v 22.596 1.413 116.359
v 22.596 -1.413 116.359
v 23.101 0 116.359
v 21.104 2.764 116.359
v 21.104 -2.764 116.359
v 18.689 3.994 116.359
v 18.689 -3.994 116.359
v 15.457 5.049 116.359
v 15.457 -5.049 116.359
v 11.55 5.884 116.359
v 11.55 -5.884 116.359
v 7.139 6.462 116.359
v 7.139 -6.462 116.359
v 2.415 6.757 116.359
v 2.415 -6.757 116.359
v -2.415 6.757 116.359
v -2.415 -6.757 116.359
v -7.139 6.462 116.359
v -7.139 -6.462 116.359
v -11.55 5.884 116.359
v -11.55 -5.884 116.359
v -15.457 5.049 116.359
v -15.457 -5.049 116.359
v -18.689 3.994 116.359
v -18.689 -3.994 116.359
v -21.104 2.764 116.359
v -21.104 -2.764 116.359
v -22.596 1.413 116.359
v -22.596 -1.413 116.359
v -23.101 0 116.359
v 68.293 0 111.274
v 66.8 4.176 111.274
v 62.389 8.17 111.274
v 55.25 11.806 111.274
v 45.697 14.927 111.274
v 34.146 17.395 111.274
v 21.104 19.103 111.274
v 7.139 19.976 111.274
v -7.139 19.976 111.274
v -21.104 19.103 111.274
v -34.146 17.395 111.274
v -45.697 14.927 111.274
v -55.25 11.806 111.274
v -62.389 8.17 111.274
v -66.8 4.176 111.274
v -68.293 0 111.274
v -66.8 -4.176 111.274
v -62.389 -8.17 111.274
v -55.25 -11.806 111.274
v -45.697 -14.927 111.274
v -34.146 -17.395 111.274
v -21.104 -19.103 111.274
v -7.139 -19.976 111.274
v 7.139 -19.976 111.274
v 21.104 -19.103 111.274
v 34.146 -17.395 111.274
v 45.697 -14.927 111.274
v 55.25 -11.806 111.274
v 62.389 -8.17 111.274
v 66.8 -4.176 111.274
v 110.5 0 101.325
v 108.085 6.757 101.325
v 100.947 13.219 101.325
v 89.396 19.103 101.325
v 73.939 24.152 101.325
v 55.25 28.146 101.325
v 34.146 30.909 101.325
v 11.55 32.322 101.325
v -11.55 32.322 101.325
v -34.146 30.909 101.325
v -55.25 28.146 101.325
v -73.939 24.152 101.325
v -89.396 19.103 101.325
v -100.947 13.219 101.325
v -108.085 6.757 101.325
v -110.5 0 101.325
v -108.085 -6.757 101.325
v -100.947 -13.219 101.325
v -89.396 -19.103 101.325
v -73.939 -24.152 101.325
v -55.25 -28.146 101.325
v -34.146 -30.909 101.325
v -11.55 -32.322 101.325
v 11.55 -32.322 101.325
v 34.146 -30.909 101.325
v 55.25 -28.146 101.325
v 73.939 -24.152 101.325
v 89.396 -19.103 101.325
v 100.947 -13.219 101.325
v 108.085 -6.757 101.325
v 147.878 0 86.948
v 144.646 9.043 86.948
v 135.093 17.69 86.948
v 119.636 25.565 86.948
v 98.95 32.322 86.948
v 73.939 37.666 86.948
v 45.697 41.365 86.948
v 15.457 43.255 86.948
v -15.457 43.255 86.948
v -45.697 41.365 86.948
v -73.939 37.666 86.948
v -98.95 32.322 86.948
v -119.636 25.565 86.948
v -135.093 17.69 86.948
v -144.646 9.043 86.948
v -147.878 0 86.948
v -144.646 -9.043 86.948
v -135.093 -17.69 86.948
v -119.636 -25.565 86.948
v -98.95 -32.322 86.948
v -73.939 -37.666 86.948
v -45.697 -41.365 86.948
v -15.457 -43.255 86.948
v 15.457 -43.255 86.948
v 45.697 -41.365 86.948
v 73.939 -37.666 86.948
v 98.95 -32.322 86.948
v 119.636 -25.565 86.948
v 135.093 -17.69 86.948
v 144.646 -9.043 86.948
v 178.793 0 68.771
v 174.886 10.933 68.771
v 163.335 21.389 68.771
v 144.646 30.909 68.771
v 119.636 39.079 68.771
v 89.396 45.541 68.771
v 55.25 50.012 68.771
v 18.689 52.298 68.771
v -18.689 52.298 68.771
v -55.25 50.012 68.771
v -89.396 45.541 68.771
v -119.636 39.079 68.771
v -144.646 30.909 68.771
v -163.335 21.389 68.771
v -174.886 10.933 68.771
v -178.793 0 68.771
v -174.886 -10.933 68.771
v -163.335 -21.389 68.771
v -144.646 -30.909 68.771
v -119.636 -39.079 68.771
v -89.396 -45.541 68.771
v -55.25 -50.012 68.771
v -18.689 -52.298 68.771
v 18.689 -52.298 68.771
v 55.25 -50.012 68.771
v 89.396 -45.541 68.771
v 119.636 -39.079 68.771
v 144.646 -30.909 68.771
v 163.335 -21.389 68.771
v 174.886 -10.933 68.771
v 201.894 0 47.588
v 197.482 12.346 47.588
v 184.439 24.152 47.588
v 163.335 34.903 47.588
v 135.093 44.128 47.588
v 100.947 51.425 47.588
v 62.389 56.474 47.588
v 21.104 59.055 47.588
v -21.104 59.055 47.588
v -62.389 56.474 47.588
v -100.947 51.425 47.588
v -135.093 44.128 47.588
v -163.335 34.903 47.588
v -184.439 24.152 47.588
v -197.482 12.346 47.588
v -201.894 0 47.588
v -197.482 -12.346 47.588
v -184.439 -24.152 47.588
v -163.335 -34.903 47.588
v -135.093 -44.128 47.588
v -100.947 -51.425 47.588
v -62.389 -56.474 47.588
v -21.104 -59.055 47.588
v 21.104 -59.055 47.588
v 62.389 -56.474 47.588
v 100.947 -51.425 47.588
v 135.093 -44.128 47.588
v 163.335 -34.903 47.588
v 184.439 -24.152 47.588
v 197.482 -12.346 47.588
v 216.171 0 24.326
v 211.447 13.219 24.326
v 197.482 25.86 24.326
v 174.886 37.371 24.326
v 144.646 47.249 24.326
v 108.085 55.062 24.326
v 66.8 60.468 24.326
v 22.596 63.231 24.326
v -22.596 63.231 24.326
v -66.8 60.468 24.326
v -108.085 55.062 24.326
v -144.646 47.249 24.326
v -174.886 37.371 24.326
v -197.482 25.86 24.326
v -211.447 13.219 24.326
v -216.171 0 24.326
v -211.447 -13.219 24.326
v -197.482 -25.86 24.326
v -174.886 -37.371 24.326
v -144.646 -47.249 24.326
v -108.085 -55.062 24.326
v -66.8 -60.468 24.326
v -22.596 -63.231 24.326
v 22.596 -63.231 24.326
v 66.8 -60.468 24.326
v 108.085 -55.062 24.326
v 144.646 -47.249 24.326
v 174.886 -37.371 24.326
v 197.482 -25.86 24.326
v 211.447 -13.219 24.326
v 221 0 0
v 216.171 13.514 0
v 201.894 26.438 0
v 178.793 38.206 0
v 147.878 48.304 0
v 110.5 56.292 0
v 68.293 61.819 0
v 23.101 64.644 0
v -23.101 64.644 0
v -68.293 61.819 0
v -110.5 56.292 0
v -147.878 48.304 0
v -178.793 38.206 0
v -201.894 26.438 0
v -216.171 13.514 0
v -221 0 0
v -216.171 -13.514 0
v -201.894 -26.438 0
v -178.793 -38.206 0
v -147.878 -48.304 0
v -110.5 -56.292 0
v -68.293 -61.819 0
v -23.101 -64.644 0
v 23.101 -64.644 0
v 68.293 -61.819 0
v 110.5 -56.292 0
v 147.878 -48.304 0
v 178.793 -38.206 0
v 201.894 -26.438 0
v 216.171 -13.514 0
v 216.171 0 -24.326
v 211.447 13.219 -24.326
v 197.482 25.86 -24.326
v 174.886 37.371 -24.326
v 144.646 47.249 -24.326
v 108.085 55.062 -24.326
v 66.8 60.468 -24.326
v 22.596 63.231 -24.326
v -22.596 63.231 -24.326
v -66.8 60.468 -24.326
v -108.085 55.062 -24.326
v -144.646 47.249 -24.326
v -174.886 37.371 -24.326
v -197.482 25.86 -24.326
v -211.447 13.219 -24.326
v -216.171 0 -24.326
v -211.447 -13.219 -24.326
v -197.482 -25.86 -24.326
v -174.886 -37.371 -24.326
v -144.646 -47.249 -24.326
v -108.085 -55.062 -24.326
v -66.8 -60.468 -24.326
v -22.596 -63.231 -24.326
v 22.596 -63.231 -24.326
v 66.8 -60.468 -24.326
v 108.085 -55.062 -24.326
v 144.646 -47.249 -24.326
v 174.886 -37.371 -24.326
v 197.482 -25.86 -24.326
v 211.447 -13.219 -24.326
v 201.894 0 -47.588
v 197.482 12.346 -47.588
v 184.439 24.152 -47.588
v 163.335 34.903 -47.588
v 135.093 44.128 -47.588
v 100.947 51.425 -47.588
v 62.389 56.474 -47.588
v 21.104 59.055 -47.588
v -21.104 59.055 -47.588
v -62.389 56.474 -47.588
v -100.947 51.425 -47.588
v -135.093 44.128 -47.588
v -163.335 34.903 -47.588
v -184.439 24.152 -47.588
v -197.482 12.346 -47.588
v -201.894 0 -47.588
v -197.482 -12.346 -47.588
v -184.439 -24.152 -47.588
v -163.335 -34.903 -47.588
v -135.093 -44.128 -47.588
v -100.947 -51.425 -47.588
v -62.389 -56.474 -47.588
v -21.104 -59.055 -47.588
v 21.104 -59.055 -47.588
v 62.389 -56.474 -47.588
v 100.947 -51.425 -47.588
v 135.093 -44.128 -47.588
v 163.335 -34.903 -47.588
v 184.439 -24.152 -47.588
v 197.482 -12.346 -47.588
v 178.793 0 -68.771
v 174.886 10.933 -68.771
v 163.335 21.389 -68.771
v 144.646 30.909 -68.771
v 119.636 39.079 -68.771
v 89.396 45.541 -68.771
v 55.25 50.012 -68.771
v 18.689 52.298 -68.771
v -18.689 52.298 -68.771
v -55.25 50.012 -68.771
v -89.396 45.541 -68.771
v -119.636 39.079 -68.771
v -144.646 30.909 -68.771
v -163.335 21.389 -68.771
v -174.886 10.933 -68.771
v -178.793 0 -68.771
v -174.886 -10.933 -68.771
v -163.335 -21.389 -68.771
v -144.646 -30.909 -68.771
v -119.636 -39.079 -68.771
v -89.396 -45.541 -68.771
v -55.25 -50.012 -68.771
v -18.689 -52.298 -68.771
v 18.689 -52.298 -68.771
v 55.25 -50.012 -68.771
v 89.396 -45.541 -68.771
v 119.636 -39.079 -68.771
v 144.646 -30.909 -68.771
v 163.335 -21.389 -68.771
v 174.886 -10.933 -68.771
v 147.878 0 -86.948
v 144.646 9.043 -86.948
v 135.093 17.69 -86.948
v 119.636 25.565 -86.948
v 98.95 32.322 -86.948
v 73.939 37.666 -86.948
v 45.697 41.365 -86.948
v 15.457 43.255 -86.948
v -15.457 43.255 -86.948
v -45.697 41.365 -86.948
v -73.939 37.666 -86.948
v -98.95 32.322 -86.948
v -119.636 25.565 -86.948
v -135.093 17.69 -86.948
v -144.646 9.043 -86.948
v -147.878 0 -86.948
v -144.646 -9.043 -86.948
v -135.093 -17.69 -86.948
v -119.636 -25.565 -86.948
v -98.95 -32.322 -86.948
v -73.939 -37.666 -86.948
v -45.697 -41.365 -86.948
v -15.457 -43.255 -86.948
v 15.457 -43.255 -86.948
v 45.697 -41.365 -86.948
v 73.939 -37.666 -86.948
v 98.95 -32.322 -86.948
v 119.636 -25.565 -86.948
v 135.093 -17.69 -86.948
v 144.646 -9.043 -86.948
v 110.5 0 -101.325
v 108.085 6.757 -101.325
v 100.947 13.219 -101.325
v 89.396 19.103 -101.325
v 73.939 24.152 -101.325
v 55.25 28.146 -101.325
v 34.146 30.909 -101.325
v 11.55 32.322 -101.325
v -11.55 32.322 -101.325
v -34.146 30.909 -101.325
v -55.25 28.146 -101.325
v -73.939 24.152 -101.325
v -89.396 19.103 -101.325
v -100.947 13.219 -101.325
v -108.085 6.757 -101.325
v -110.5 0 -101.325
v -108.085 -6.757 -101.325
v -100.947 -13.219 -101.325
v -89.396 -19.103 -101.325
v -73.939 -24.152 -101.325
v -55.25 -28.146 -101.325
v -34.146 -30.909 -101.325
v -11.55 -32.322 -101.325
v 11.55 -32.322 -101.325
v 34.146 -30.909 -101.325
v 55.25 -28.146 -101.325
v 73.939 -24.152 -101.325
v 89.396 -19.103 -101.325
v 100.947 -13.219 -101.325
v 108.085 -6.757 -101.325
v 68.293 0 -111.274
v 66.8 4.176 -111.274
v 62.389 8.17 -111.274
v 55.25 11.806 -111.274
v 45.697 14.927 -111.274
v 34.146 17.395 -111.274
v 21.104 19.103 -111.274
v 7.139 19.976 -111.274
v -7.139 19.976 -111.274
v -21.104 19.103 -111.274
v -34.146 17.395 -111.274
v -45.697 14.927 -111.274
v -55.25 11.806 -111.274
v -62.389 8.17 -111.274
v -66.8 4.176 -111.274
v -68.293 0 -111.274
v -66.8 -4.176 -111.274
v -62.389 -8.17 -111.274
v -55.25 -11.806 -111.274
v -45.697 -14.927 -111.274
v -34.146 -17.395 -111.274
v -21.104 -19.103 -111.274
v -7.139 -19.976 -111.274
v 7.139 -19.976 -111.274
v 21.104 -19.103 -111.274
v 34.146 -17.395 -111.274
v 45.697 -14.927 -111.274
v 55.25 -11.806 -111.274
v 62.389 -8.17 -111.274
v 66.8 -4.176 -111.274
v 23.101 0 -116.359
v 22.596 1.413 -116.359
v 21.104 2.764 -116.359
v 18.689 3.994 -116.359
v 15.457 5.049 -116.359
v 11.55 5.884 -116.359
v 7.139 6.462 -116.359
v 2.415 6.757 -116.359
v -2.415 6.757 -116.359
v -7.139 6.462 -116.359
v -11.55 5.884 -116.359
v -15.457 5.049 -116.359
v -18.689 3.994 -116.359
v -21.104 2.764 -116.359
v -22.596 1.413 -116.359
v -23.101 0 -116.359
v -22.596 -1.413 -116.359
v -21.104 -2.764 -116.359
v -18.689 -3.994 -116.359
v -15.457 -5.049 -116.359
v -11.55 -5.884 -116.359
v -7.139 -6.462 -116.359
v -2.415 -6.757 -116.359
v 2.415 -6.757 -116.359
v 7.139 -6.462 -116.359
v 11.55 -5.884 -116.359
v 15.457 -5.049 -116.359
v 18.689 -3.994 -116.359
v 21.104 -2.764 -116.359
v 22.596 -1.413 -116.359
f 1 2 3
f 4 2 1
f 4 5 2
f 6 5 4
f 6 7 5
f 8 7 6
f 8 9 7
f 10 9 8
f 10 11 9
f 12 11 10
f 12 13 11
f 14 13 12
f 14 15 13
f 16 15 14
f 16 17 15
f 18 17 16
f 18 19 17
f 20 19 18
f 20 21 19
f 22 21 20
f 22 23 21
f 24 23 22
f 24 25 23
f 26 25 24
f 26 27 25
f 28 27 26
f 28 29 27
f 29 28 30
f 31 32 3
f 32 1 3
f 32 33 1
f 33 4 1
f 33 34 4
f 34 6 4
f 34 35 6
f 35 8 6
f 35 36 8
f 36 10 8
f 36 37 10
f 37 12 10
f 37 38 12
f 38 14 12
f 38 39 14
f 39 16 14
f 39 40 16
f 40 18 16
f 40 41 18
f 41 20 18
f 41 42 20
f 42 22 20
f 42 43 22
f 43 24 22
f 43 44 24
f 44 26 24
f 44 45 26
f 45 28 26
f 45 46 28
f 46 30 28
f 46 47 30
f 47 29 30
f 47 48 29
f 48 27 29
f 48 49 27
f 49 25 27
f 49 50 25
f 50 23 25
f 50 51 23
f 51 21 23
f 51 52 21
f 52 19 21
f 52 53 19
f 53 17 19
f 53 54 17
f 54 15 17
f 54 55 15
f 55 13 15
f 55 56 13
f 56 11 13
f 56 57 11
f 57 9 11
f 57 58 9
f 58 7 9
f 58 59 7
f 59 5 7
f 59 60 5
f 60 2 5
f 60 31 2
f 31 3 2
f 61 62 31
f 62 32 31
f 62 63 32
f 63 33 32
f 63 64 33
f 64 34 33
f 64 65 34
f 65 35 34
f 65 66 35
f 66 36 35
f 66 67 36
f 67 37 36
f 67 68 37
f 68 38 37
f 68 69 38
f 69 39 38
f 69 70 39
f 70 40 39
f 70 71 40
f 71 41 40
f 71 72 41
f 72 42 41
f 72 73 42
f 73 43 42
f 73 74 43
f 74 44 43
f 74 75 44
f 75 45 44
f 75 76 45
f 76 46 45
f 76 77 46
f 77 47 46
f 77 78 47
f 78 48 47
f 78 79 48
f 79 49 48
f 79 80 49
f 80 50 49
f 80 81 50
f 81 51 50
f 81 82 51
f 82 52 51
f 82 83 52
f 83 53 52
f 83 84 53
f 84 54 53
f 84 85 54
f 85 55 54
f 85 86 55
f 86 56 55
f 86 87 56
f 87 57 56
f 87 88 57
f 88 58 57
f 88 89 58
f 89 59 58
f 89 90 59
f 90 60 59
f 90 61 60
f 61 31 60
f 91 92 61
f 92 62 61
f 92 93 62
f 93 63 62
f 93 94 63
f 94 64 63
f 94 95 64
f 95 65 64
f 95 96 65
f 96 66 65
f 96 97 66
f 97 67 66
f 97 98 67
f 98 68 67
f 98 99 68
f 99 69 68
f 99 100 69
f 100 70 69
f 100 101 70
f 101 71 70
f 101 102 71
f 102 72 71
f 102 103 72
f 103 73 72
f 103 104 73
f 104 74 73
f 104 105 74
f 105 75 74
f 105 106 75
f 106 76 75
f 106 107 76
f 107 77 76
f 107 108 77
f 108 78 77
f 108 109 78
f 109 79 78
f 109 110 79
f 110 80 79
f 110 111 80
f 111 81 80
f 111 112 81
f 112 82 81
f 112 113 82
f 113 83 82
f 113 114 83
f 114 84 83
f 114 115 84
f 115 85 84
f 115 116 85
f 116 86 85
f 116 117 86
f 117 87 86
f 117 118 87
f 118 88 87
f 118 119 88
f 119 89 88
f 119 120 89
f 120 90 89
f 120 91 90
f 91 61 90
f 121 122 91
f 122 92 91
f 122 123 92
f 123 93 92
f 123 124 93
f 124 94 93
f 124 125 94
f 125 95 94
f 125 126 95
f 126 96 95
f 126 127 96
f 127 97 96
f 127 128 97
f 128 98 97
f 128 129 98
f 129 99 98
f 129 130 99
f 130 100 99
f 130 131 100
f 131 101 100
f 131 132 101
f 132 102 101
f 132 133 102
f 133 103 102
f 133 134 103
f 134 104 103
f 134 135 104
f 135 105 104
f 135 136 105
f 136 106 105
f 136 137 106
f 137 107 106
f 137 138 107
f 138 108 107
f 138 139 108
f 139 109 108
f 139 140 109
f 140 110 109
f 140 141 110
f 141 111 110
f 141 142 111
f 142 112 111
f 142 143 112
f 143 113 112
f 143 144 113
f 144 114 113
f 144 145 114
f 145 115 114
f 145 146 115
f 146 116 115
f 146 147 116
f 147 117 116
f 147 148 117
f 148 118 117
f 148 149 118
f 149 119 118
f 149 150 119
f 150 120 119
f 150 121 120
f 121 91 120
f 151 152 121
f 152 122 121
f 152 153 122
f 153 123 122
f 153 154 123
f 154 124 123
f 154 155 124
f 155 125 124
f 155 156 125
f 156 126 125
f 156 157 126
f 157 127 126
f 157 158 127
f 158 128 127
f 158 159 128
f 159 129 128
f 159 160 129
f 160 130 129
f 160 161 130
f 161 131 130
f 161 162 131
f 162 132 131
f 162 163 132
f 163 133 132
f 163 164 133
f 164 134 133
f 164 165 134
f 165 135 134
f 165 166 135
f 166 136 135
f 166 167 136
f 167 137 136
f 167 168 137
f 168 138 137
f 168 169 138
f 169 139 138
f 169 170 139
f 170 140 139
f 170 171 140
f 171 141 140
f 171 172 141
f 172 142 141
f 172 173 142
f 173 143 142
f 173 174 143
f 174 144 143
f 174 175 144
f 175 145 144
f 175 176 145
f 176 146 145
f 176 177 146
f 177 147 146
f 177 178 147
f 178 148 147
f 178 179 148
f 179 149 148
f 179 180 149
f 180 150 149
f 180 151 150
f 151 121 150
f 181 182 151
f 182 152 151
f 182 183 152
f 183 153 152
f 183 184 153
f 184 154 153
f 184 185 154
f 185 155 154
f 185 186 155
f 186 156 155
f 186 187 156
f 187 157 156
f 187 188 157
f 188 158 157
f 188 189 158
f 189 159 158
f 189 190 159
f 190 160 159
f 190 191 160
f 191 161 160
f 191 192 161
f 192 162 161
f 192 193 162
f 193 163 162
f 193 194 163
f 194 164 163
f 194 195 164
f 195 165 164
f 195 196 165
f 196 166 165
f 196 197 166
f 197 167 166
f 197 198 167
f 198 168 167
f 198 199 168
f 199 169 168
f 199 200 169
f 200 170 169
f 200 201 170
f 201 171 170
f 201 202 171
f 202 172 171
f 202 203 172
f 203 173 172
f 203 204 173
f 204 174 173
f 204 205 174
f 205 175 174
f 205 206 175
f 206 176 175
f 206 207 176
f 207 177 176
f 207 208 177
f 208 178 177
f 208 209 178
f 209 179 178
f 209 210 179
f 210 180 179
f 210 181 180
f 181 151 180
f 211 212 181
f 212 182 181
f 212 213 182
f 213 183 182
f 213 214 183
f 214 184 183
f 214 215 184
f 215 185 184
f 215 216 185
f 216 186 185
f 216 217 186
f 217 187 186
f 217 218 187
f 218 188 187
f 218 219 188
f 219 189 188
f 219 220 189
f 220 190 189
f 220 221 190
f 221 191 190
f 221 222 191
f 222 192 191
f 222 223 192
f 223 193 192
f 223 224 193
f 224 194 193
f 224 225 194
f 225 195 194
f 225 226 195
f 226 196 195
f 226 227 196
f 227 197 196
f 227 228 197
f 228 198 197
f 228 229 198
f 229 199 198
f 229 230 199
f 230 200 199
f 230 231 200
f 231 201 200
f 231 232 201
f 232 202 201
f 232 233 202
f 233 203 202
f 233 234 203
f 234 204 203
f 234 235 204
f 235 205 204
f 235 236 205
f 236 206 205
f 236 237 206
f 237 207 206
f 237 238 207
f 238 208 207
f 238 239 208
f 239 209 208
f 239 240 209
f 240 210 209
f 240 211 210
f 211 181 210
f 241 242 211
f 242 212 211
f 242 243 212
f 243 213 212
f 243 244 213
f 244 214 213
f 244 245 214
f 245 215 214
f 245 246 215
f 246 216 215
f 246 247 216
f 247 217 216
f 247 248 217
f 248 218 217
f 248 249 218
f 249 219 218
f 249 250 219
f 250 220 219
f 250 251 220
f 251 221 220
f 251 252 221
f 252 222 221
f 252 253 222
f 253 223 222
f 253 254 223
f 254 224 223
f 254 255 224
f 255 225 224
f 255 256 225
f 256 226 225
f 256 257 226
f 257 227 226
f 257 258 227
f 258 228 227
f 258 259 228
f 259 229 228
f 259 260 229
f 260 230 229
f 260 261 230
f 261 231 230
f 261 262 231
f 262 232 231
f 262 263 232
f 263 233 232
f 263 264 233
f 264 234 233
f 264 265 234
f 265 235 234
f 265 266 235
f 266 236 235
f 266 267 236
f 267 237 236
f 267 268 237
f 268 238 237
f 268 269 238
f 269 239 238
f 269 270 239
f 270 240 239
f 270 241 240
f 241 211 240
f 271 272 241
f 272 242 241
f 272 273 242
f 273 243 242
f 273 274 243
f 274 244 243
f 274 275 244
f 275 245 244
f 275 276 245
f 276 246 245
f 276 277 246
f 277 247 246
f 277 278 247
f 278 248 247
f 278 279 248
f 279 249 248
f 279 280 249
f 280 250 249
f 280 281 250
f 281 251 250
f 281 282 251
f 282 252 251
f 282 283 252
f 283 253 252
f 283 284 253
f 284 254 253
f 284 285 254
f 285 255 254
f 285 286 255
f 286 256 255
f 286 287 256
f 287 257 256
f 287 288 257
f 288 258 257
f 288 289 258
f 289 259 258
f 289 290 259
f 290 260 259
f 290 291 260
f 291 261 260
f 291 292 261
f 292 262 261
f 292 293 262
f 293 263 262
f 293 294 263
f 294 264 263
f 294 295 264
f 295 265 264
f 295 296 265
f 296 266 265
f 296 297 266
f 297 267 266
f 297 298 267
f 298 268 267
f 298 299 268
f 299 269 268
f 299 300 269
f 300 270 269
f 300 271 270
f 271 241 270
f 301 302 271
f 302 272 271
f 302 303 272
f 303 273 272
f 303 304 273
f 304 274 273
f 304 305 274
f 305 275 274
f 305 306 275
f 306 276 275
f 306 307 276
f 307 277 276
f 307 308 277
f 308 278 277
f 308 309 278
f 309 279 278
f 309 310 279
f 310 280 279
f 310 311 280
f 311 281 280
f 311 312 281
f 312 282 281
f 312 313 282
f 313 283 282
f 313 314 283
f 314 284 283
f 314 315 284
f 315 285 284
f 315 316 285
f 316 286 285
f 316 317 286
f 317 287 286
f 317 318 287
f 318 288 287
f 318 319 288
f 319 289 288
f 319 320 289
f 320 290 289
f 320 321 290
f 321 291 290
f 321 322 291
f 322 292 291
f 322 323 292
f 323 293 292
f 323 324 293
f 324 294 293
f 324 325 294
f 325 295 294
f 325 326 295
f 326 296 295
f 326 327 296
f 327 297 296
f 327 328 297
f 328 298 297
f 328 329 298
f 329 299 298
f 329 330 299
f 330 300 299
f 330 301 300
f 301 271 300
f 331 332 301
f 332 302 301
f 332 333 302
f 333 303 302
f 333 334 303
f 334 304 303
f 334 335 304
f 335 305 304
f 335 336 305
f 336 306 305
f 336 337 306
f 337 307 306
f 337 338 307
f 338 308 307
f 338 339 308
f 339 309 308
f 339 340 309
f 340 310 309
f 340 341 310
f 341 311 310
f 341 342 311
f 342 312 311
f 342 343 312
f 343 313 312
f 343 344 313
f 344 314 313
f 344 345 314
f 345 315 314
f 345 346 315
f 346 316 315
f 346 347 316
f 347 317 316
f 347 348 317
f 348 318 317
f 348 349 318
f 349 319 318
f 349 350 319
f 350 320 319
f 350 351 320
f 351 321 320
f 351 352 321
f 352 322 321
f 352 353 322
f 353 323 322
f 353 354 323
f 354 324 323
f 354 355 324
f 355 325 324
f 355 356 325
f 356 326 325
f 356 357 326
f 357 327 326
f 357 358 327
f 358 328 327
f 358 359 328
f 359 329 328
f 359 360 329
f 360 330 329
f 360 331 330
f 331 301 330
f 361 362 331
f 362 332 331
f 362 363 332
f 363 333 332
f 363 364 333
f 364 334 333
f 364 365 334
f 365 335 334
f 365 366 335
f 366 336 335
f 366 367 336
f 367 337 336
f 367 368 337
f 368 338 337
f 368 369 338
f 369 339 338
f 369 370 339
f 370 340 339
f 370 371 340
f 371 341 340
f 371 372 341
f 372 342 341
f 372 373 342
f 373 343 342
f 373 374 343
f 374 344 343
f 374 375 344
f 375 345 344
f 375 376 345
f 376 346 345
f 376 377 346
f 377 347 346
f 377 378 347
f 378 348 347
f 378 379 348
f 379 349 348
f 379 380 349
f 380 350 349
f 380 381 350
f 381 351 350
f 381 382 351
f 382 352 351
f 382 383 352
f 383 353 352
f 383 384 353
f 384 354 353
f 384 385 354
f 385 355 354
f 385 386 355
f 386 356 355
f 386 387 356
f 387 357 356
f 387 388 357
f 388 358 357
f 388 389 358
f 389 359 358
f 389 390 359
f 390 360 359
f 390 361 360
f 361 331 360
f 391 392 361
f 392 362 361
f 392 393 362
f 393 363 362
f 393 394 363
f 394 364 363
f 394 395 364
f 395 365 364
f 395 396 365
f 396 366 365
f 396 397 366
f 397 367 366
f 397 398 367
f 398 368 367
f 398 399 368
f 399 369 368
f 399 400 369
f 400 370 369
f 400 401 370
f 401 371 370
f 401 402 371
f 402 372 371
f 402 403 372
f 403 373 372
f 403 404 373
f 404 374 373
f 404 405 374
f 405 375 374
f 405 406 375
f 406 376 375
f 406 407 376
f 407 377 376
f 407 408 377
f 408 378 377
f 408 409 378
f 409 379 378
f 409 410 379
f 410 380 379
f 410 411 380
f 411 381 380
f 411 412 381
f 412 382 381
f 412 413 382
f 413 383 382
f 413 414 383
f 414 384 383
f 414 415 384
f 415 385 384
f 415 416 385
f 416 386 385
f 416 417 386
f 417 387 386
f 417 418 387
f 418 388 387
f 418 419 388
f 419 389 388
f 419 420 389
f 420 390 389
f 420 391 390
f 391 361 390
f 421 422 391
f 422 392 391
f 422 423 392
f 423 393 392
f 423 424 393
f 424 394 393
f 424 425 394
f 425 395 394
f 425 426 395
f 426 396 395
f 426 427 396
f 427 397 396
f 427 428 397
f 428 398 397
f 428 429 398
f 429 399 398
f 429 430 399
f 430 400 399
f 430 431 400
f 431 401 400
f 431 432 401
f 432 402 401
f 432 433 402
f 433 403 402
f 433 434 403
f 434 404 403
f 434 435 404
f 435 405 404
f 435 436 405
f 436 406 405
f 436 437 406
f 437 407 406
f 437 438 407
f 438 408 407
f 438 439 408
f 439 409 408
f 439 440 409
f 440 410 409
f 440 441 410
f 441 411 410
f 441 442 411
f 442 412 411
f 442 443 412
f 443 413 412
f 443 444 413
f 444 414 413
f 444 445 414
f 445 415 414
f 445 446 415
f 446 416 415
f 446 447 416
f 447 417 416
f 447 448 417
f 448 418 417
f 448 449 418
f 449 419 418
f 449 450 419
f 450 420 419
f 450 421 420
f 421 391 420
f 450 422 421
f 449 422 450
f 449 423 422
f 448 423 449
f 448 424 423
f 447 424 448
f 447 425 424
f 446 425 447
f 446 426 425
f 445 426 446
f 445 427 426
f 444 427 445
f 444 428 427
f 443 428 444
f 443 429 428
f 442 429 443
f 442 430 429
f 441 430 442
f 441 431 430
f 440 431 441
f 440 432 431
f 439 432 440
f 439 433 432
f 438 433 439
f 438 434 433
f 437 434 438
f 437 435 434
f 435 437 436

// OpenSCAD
// Generated by SolidPython 1.0.1 on 2020-07-29 00:46:52


scale(v = [17, 5, 9]) {
	sphere(r = 13);
}
/***********************************************
*********      SolidPython code:      **********
************************************************
 
# import packages: SolidPython
from solid import *
from solid.utils import *
from itertools import chain, combinations, permutations


class Resize:

    def __init__(self, scad_file):
        self.scad_file = scad_file
        #self.scad_file = import_scad(scad_file)
        # cone/cylinder param:
        self.r1 = 0
        self.r2 = 0
        self.h = 0
        # rectangular prism param:
        self.w = 0
        self.l = 0
        # ellipse param:
        self.r = 0

    # import OpenScad code (file name corresponds to shape)


    # classify shape + parameters
    def assign(self, param1, param2, param3):
        if self.scad_file == 'cone.scad':
            self.r1 = param1
            self.r2 = param2
            self.h = param3
        elif self.scad_file == 'cylinder.scad':
            self.r1 = param1
            self.r2 = param2
            self.h = param3
        elif self.scad_file == 'rectangularPrism.scad':
            self.h = param1
            self.l = param2
            self.w = param3
        else:
            self.r = param1
            self.h = param2

    # resize parameters
    def iterate(self):
        x = range(3, 20, 2)
        i = 1
        if self.scad_file == 'cone.scad':
            tempList = list(permutations(x, 2))
            for temp in tempList:
                param1 = temp[0]
                param2 = temp[1]
                filepath = 'produced_scad_files/' + 'cone' + str(param1) + '_' + str(param2) + '_' + '.scad'
                scad_render_to_file(cylinder(h=param1, r1=param2, r2=0), filepath)

        elif self.scad_file == 'cylinder.scad':
            tempList = list(permutations(x, 3))
            for temp in tempList:
                param1 = temp[0]
                param2 = temp[1]
                filepath = 'produced_scad_files/' + 'cylinder' + str(param1) + '_' + str(param2) + '_' + '.scad'
                scad_render_to_file(cylinder(h=param1, r1=param2, r2=param2), filepath)

        elif self.scad_file == 'rectangularPrism.scad':
            tempList = list(permutations(x, 3))
            for temp in tempList:
                param1 = temp[0]
                param2 = temp[1]
                param3 = temp[2]
                filepath = 'produced_scad_files/' + 'rectangularPrism' + str(param1) + '_' + str(param2) + '_' + str(
                    param3) + '.scad'
                scad_render_to_file(cube(size=(param1, param2, param3)), filepath)

        elif self.scad_file == 'ellipse.scad':
            tempList = list(permutations(x, 4))
            for temp in tempList:
                param1 = temp[0]
                param2 = temp[1]
                param3 = temp[2]
                param4 = temp[3]
                filepath = 'produced_scad_files/' + 'ellipse' + str(param1) + '_' + str(param2) + '_' + str(param3) + '_' + str(param4) + '.scad'
                scad_render_to_file(scale([param1, param2, param3])(sphere(r=param4)), filepath)

    def render_to_scadfile(self):
        scad_render_to_file(scad, 'example.scad') 
 
************************************************/
